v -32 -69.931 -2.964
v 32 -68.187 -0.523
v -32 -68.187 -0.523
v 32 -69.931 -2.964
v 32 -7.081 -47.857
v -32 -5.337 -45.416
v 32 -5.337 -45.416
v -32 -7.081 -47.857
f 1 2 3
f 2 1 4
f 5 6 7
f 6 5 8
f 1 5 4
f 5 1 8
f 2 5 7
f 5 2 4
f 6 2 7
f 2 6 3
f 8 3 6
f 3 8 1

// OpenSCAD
// file: ../config.scad
// all measures in millimeters

// rendering quality
$fn = 200;

// material to cut from
material_z = 3;

// wall configuration: bounding box measures
wall_x = 550;
wall_y = 150;
wall_z = 400;

wall_width = 30;
foot_z = 30;

// pots are hung at wall supports
support_count = 5;
support_z = 30;

// pot configuration: outer measures of the top opening
pot_x = 70;
pot_y = 70;
pot_z = 50;

// pots have hooks to hang at the wall supports
hook_width = 10;
// main file
include <../config.scad>;

module pot_front()
{
    angle = atan(pot_y/pot_z);
    diagonal_length = sqrt(pow(pot_y,2) + pow(pot_z,2));

    e = material_z/2;
    m = material_z;
    d1 = m / sin(angle);
    f = sin(angle) * e;
    d2 = f / sin(90-angle);
    lower_inset = d1 + d2;

    upper_inset = 3;

    translate([
        0,
        -sin(angle)*lower_inset - material_z/2,
        -pot_z + sin(90-angle)*lower_inset
        ])
    rotate([
        angle,
        0,
        0
        ])
    // rotate round the bottom middle
    translate([
        0,
        0,
        (diagonal_length - lower_inset - upper_inset)/2
        ])
    cube([
        pot_x - 2*material_z,
        material_z,
        diagonal_length - lower_inset - upper_inset
        ], center=true);
}

pot_front();
